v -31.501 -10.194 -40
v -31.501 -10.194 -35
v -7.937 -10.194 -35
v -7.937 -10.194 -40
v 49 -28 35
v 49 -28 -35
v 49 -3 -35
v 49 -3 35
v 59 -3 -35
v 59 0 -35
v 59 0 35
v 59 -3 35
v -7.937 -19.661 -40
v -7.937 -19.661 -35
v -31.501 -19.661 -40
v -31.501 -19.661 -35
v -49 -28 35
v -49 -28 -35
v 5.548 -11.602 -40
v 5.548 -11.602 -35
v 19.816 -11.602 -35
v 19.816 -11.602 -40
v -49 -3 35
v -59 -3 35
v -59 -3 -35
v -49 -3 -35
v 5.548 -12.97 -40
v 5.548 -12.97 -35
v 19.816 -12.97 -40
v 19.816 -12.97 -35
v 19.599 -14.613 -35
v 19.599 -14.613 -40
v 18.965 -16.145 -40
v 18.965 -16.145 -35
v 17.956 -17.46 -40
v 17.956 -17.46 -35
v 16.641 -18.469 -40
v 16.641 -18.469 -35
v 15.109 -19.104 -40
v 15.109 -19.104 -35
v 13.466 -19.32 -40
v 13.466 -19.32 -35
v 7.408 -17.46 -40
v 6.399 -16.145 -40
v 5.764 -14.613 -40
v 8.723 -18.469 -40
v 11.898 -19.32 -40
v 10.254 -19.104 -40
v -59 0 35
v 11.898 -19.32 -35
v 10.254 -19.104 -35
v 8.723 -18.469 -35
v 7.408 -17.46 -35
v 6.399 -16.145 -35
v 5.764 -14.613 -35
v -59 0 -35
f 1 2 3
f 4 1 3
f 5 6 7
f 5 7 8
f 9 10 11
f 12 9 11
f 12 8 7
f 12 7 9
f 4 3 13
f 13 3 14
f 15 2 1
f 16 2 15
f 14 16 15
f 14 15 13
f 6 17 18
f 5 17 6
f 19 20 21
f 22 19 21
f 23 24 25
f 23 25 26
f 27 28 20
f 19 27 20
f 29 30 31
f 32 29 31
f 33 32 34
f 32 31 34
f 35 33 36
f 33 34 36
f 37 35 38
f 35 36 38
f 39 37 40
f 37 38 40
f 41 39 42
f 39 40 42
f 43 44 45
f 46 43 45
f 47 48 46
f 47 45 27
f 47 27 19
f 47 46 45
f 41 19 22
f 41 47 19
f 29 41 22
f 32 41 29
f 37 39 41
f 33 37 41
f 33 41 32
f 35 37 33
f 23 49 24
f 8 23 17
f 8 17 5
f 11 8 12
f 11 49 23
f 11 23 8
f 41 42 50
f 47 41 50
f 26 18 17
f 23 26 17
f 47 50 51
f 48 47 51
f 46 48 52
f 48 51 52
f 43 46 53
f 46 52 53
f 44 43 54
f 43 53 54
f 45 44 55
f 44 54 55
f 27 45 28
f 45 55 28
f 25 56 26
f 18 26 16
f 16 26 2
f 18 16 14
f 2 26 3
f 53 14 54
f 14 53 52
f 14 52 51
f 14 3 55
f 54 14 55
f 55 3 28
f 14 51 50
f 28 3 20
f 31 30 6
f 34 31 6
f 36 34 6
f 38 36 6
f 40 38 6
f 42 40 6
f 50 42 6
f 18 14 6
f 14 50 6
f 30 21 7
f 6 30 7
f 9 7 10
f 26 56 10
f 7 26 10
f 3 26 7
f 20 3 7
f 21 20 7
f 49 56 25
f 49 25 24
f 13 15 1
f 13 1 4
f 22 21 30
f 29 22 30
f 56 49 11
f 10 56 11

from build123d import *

# Parameters (mm, degrees)
F0_W     = 118
F0_H     = 70
F1_DEPTH = 28
F2_W     = 10
F2_H     = 70
F3_DEPTH = 25
F4_W     = 23.56403
F4_H     = 9.46647
F5_DEPTH = 5


with BuildPart() as f1:
    # F0 (on Front) → F1 (new body)
    with BuildSketch(Plane.XZ):
        Rectangle(F0_W, F0_H)
    extrude(amount=F1_DEPTH)

    # F2 (on face) → F3 (cut)
    with BuildSketch(Plane.XZ.offset(28)):
        with Locations((54, 0)):
            Rectangle(F2_W, F2_H)
        with Locations((-54, 0)):
            Rectangle(F2_W, F2_H)
    extrude(amount=-F3_DEPTH, mode=Mode.SUBTRACT)

    # F4 (on face) → F5 (join)
    with BuildSketch(Plane(origin=(0, 0, -35), x_dir=(1, 0, 0), z_dir=(0, 0, -1))):
        with BuildLine():
            Line((13.465698, 19.319981), (11.897889, 19.319981))
            ThreePointArc((11.897889, 19.319981), (7.407761, 17.460109), (5.547889, 12.969981))
            Line((5.547889, 12.969981), (5.547889, 11.602327))
            Line((5.547889, 11.602327), (19.815698, 11.602327))
            Line((19.815698, 11.602327), (19.815698, 12.969981))
            ThreePointArc((19.815698, 12.969981), (17.955826, 17.460109), (13.465698, 19.319981))
        make_face()
        with Locations((-19.718742, 14.927268)):
            Rectangle(F4_W, F4_H)
    extrude(amount=F5_DEPTH)


solid = f1.part
